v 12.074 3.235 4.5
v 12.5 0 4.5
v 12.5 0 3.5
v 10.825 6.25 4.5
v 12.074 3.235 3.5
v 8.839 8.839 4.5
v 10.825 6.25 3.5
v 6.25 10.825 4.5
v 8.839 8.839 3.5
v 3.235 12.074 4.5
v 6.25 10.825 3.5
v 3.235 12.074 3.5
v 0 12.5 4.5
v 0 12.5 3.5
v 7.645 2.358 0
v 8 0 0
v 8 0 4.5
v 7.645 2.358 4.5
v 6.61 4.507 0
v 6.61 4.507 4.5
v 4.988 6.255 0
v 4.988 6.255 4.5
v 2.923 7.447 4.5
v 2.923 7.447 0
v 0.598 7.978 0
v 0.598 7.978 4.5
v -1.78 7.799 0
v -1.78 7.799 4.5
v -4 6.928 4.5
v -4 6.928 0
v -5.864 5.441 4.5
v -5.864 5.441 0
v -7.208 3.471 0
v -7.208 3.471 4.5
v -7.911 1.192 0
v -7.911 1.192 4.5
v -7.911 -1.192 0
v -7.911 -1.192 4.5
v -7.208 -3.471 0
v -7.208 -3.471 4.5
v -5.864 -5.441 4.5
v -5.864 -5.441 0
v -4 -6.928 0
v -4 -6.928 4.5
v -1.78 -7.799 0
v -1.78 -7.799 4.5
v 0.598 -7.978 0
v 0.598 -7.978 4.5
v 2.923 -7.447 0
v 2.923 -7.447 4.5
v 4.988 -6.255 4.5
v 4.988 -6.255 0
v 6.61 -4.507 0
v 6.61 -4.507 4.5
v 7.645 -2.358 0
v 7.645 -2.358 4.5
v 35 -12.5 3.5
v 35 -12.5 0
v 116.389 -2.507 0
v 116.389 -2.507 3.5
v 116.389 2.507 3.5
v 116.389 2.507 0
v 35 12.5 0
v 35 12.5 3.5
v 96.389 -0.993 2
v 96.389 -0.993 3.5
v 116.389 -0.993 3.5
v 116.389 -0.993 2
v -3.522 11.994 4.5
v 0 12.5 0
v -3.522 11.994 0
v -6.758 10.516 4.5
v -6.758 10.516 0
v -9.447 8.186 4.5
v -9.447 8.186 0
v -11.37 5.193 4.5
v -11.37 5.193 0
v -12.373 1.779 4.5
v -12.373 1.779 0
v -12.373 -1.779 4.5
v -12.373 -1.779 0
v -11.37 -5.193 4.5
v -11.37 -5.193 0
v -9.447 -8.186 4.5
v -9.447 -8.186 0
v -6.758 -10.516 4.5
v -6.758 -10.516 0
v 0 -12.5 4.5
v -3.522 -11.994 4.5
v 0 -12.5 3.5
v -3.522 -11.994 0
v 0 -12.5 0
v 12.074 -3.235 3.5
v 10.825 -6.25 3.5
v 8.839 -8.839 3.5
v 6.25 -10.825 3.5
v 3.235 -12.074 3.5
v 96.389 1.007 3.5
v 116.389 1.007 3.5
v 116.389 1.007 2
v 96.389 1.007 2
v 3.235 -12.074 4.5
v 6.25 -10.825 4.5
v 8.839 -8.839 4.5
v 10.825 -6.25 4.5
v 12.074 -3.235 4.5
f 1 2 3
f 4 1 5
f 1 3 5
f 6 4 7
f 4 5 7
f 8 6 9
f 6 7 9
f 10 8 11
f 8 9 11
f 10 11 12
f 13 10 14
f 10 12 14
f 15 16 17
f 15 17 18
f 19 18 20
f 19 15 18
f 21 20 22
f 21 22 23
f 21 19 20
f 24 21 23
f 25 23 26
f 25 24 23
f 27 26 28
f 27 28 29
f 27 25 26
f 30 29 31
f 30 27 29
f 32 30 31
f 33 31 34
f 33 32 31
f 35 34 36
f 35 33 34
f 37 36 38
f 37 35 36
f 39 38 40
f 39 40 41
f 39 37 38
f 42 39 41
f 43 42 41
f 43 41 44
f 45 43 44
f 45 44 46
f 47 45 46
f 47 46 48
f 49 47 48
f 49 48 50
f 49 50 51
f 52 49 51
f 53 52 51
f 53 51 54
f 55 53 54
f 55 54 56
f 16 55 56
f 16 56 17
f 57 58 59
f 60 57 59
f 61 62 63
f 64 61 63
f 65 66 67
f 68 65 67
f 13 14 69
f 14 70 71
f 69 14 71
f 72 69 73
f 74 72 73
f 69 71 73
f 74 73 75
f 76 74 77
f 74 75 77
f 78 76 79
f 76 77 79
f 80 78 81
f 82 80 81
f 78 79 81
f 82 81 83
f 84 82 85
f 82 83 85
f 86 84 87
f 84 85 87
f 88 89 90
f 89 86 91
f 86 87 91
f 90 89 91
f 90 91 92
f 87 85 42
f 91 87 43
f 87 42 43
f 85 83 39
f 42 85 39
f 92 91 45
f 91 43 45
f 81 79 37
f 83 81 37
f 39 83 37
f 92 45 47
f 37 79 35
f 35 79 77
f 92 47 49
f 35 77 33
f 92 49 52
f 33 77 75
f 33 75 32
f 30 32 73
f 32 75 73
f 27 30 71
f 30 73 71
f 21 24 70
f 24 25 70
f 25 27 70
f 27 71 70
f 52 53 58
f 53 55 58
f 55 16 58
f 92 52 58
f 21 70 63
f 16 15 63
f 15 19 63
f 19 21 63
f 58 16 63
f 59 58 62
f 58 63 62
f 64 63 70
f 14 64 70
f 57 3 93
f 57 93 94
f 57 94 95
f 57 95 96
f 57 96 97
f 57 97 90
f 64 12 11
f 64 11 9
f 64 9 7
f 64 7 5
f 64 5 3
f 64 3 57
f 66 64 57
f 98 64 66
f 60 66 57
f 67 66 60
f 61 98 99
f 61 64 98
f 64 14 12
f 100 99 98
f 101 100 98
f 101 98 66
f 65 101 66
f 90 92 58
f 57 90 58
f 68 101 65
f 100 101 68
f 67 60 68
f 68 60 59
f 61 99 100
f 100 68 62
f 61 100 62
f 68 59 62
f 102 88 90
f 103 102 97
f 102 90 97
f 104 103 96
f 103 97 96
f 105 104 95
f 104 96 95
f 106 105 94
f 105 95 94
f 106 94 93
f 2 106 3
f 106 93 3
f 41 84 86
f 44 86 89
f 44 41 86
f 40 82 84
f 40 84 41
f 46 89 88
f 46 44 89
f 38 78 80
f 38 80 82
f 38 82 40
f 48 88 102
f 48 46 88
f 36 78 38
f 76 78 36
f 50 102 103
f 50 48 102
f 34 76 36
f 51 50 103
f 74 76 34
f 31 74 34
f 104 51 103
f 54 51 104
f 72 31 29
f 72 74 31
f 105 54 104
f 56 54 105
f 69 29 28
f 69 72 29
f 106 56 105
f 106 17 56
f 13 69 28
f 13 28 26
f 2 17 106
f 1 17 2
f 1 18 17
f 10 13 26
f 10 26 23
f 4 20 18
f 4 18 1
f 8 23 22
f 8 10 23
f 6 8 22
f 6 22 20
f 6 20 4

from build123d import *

# Parameters (mm, degrees)
F0_R     = 8
F1_DEPTH = 3.5
F2_DEPTH = 4.5
F4_DEPTH = 1.5


with BuildPart() as f1:
    # F0 (on Top) → F1 (new body)
    with BuildSketch(Plane.XY):
        with BuildLine():
            ThreePointArc((0, -12.5), (8.838835, -8.838835), (12.5, 0))
            ThreePointArc((12.5, 0), (8.838835, 8.838835), (0, 12.5))
            ThreePointArc((0, 12.5), (-12.5, 0), (0, -12.5))
        make_face()
        Circle(F0_R, mode=Mode.SUBTRACT)
        with BuildLine():
            ThreePointArc((0, 12.5), (8.838835, 8.838835), (12.5, 0))
            ThreePointArc((12.5, 0), (8.838835, -8.838835), (0, -12.5))
            Line((0, -12.5), (35, -12.5))
            Line((35, -12.5), (116.388784, -2.506714))
            Line((116.388784, -2.506714), (116.388784, 2.506714))
            Line((116.388784, 2.506714), (35, 12.5))
            Line((35, 12.5), (0, 12.5))
        make_face()
    extrude(amount=F1_DEPTH)

    # F0 (on Top) → F2 (join)
    with BuildSketch(Plane.XY):
        with BuildLine():
            ThreePointArc((0, -12.5), (8.838835, -8.838835), (12.5, 0))
            ThreePointArc((12.5, 0), (8.838835, 8.838835), (0, 12.5))
            ThreePointArc((0, 12.5), (-12.5, 0), (0, -12.5))
        make_face()
        Circle(F0_R, mode=Mode.SUBTRACT)
    extrude(amount=F2_DEPTH)

    # F3 (on face) → F4 (cut)
    with BuildSketch(Plane.XY.offset(3.5)):
        Polygon((116.388784, 0), (116.388784, 1.006714), (96.388784, 1.006714), (96.388784, 0), (96.388784, -0.993286), (116.388784, -0.993286), align=None)
    extrude(amount=-F4_DEPTH, mode=Mode.SUBTRACT)


solid = f1.part
